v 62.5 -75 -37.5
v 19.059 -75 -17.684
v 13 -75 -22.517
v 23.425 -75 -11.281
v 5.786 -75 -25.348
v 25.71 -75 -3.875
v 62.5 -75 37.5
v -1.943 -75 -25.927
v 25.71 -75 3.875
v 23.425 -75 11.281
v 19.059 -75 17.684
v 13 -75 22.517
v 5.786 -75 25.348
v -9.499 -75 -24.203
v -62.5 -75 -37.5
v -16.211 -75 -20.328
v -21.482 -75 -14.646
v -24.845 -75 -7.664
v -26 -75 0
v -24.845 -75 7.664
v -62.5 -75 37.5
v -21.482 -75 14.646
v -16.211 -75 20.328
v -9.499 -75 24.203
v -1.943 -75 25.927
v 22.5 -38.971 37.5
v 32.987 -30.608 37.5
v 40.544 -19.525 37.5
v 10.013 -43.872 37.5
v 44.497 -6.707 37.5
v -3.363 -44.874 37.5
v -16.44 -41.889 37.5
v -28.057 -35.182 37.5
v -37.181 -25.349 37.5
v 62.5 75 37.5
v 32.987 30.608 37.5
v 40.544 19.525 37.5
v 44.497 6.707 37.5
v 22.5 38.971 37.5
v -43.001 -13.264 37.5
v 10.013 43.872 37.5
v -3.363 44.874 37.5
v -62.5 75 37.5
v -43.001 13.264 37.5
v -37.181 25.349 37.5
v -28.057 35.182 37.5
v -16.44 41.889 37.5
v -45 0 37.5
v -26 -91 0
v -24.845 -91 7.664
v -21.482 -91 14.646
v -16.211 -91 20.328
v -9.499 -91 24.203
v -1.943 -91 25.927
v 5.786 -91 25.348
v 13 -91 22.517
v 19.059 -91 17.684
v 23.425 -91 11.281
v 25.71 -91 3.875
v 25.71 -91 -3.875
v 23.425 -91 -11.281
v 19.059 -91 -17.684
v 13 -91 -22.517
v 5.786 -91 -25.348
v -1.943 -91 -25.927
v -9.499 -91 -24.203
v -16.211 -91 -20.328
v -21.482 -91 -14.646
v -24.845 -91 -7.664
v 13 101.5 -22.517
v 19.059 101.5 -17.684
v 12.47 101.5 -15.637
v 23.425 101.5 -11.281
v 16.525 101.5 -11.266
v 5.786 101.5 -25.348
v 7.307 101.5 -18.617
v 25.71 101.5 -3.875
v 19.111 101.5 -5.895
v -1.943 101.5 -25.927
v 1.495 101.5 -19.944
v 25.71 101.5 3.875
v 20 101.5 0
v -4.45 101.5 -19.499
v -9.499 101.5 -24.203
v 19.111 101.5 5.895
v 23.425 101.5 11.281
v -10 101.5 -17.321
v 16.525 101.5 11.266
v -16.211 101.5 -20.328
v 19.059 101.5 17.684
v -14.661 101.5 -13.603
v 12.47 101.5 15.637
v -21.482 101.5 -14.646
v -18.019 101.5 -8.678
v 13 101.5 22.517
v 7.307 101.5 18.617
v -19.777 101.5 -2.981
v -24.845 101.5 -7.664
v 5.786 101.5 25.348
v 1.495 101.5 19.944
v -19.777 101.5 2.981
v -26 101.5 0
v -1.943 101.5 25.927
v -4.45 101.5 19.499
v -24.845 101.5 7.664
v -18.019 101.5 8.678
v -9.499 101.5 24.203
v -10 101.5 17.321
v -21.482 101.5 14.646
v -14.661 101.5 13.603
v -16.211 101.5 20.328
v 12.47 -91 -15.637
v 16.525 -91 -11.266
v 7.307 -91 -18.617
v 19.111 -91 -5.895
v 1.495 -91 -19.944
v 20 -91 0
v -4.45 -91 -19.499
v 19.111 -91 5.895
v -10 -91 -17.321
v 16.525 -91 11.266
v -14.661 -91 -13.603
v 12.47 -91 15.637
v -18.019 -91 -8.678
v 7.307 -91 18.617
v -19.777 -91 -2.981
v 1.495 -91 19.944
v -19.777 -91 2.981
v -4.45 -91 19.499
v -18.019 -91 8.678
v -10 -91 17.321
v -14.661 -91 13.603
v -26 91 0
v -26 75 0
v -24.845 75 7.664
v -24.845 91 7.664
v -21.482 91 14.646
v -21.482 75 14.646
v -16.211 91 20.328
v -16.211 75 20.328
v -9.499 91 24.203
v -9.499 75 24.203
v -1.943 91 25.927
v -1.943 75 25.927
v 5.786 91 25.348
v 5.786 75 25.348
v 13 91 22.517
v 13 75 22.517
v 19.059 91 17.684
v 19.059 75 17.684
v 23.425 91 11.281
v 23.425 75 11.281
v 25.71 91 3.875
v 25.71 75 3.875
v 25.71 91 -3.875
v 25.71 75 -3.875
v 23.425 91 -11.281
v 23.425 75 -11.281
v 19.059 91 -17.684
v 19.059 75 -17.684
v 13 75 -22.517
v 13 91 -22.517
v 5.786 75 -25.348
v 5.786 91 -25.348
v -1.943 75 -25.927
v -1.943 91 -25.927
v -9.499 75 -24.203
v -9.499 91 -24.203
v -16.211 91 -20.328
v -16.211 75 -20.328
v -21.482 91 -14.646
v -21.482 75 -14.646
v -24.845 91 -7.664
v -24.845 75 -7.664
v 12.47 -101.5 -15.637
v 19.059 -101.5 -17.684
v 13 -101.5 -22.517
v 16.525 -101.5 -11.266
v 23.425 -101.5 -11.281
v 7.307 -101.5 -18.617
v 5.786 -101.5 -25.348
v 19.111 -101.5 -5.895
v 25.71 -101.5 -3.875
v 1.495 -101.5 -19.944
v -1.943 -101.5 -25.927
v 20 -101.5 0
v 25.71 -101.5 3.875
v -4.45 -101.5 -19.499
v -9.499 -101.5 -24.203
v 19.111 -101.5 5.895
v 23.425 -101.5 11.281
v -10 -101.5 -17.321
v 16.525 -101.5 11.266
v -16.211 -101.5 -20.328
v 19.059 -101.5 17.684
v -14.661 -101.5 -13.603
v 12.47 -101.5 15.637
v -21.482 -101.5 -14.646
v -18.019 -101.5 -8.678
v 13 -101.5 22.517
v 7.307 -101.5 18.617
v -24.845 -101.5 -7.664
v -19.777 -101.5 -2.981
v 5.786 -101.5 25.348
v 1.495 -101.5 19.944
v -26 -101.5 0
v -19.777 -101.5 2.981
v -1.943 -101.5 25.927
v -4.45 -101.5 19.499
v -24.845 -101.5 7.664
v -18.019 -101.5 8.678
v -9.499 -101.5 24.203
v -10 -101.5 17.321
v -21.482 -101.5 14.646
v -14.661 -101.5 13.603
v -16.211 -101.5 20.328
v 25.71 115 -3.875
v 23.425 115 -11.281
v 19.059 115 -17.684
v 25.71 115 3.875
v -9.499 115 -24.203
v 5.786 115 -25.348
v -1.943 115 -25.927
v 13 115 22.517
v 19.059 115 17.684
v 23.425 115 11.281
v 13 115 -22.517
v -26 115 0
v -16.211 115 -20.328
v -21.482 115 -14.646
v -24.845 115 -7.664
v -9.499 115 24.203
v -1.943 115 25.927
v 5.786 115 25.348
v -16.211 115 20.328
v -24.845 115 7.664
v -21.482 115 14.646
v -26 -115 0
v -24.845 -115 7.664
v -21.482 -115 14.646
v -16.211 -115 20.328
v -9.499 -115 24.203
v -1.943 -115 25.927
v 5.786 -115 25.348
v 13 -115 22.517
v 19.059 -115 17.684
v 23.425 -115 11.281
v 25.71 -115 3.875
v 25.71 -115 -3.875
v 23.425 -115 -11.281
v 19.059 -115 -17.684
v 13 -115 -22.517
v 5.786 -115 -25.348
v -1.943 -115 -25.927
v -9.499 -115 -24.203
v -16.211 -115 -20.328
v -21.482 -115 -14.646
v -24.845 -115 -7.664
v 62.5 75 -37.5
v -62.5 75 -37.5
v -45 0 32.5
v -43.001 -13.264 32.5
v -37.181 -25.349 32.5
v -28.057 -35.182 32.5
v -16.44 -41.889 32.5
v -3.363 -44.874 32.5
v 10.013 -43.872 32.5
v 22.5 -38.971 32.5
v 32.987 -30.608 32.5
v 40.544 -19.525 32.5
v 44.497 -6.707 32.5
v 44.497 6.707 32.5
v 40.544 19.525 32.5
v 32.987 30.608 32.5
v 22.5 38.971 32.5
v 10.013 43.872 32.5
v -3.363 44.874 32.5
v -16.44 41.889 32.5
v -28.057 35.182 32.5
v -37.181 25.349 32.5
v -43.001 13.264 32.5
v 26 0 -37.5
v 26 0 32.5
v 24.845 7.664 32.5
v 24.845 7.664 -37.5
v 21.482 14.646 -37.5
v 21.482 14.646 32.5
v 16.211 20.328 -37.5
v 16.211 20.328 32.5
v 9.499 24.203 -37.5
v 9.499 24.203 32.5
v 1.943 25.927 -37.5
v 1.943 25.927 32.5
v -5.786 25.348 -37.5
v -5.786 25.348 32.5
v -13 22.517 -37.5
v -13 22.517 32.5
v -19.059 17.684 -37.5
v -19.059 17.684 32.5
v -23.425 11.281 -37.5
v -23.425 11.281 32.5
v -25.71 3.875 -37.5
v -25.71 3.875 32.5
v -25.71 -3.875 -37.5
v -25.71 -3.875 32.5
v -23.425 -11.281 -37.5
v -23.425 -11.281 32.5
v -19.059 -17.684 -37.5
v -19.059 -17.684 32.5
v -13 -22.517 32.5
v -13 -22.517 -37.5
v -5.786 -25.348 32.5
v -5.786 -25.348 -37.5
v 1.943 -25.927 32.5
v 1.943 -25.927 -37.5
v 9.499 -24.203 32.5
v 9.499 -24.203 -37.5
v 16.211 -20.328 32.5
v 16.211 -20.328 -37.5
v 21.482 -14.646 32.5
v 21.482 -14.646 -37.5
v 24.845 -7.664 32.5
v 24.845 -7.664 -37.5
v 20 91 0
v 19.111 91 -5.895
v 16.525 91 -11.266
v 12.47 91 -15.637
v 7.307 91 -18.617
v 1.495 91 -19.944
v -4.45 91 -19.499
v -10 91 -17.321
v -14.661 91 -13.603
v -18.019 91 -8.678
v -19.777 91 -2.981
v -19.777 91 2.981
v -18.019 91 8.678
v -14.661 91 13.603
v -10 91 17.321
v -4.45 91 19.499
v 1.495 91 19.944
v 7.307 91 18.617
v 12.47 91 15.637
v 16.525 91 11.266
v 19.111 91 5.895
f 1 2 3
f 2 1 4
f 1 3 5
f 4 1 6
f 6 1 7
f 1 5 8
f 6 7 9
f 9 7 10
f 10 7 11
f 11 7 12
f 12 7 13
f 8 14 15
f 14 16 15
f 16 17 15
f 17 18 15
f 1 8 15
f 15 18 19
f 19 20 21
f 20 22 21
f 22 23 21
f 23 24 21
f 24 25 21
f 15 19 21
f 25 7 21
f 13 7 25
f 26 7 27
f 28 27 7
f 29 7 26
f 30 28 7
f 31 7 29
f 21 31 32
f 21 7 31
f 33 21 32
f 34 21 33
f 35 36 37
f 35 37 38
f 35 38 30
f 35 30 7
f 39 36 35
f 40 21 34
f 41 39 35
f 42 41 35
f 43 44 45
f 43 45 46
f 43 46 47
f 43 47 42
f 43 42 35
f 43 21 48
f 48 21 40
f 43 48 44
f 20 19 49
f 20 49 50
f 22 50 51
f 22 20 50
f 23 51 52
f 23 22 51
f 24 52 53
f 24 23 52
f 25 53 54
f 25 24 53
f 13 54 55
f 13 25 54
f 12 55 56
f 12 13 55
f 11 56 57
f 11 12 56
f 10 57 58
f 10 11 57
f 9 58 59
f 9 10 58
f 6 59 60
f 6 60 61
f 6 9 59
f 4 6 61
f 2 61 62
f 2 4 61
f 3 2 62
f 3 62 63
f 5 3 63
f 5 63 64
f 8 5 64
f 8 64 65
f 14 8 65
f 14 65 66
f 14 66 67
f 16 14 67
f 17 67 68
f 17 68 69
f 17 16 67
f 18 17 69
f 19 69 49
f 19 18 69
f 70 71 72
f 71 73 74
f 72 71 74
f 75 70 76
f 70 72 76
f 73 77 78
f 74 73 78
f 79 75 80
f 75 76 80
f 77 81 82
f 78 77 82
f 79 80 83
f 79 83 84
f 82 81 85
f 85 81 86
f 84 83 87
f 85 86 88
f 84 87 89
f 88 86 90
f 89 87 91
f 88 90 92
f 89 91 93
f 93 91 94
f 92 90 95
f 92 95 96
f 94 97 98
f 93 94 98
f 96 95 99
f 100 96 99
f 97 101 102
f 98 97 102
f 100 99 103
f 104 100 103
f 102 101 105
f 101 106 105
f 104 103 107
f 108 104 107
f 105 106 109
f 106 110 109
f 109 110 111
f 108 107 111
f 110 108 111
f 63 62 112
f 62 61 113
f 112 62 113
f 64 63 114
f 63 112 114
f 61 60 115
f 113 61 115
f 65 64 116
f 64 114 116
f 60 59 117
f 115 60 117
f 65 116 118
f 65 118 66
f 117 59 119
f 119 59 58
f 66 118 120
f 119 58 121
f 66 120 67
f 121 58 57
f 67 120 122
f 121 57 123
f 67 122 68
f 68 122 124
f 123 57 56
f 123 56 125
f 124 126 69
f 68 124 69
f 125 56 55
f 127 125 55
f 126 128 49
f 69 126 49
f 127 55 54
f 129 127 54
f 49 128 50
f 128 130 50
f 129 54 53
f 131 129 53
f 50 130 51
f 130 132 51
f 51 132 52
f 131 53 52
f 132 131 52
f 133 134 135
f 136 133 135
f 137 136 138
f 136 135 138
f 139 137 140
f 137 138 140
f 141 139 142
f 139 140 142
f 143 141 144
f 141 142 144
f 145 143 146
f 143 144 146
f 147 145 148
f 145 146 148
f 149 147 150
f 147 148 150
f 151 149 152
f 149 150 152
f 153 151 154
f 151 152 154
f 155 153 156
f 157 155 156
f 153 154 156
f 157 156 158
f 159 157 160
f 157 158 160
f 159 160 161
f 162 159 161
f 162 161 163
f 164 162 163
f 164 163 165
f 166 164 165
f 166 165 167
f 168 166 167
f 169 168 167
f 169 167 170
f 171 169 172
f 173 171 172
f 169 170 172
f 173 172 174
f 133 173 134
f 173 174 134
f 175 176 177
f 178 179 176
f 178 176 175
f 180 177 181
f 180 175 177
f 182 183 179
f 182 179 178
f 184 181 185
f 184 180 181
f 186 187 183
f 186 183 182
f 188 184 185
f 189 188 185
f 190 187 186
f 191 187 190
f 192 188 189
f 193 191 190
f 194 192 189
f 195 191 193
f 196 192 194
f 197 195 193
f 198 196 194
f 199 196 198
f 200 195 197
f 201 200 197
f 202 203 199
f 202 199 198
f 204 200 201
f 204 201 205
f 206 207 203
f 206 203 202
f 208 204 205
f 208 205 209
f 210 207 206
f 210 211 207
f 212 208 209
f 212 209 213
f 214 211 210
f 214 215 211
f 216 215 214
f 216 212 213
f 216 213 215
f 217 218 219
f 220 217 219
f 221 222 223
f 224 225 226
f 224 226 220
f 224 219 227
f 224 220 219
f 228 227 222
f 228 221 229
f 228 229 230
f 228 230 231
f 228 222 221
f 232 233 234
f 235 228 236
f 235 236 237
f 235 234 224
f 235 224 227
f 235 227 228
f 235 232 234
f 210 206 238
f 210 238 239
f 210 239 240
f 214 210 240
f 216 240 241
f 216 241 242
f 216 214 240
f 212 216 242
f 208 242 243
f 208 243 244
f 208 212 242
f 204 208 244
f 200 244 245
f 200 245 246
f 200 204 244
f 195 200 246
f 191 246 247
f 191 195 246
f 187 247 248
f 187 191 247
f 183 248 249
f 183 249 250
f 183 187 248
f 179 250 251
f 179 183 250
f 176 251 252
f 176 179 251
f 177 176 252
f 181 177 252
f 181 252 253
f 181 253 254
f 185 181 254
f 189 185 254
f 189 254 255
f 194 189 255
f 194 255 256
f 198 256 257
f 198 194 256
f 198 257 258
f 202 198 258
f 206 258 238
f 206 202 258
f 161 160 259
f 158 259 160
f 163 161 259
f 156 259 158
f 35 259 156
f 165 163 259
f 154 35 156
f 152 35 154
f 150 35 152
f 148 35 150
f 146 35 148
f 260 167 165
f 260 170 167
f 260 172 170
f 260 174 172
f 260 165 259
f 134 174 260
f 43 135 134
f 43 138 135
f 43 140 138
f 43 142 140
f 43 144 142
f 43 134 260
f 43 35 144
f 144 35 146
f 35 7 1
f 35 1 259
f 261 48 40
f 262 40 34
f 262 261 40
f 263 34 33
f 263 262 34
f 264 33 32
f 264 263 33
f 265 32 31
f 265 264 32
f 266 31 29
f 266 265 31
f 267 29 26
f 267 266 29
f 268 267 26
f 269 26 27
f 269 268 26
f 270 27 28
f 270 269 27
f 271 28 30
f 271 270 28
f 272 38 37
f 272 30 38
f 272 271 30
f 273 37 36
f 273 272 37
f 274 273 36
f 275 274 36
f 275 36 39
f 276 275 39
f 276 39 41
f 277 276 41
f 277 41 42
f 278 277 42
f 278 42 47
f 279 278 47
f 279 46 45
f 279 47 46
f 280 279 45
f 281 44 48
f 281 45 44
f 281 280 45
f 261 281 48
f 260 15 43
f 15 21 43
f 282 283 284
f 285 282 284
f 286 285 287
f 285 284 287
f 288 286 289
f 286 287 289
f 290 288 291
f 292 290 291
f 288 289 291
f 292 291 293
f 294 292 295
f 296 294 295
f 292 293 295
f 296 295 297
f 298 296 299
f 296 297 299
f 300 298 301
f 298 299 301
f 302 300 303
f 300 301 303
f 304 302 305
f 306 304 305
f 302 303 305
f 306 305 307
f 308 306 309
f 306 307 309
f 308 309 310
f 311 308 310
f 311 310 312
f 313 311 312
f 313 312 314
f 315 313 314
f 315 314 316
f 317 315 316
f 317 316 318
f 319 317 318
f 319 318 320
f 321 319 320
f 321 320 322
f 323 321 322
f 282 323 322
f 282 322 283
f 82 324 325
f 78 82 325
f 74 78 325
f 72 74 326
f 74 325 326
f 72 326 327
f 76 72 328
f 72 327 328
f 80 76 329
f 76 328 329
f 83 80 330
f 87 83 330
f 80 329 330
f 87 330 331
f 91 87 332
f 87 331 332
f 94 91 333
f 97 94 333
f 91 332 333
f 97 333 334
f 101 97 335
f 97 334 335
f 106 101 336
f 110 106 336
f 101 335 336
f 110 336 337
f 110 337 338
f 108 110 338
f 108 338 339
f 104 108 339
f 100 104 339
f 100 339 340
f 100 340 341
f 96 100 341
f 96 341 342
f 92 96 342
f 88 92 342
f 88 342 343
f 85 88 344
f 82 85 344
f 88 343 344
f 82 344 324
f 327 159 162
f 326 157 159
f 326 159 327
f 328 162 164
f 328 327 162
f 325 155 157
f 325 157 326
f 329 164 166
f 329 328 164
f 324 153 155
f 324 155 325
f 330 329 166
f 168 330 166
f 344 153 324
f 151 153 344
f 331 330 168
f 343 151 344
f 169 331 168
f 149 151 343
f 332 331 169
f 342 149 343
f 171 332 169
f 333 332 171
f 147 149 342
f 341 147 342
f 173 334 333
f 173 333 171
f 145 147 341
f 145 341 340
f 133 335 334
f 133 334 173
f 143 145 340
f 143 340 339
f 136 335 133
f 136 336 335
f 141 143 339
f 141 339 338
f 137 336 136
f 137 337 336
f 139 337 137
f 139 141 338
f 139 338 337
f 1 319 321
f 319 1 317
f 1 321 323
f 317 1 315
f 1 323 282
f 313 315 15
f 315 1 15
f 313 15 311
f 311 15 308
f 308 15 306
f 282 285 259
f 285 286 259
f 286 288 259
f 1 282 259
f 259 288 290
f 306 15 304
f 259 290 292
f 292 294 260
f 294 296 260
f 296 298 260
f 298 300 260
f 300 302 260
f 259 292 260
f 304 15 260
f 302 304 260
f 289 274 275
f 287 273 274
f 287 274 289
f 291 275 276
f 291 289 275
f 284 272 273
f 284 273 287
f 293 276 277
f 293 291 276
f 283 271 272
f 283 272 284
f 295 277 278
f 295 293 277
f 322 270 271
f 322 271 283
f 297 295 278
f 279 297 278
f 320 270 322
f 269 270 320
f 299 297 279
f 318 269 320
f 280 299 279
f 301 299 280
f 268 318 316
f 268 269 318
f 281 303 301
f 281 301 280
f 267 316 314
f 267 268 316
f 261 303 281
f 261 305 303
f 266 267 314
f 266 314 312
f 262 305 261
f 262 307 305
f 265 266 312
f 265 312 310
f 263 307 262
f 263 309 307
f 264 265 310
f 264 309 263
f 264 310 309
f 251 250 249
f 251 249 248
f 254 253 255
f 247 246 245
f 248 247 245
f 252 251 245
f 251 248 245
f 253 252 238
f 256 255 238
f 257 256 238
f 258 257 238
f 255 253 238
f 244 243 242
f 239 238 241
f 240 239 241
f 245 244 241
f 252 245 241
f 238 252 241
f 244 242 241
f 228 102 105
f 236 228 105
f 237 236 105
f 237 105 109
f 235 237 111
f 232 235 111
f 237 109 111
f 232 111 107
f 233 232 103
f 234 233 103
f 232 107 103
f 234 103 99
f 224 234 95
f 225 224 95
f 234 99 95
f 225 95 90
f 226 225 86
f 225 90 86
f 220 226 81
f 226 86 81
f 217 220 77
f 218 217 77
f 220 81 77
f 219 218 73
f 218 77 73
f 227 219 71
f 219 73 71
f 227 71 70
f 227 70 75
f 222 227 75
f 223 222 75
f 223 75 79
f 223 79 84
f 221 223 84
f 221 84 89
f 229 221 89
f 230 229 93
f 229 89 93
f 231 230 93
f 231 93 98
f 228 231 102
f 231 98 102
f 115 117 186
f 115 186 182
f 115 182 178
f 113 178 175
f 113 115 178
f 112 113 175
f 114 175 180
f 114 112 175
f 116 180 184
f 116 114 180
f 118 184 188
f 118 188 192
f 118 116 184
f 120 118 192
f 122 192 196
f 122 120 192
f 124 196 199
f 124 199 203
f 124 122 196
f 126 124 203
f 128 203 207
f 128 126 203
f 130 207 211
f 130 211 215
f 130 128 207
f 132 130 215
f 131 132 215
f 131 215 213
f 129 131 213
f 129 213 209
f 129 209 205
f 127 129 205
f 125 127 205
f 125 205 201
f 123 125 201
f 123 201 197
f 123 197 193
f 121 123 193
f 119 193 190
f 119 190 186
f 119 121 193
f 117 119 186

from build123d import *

# Parameters (mm, degrees)
SKETCH1_W               = 150
SKETCH1_H               = 125
BOSS_EXTRUDE1_DEPTH     = 37.5
CUT_EXTRUDE1_DEPTH      = 124.110722522
CUT_EXTRUDE1_DEPTH_BACK = 5
SKETCH2_R               = 45
CUT_EXTRUDE2_REACH      = 122.13
SKETCH3_R               = 26
SKETCH4_R               = 26
BOSS_EXTRUDE2_DEPTH     = 16
SKETCH5_R               = 20
BOSS_EXTRUDE3_DEPTH     = 10.5
SKETCH6_R               = 26
BOSS_EXTRUDE4_DEPTH     = 13.5


with BuildPart() as part:
    # Sketch1 → Boss-Extrude1 (new, symmetric)
    with BuildSketch(Plane(origin=(0, 0, 0), x_dir=(0, 1, 0), z_dir=(0, 0, 1))):
        Rectangle(SKETCH1_W, SKETCH1_H)
    extrude(amount=BOSS_EXTRUDE1_DEPTH, both=True)

    # Sketch2 → Cut-Extrude1 (cut, two sides: drawn at the far end of the back side and taken through both)
    with BuildSketch(Plane.XY.offset(37.5).offset(-CUT_EXTRUDE1_DEPTH_BACK)):
        with Locations(Location((0, 0, 0), (0, 0, 180))):
            Circle(SKETCH2_R)
    extrude(amount=CUT_EXTRUDE1_DEPTH + CUT_EXTRUDE1_DEPTH_BACK, mode=Mode.SUBTRACT)

    # Sketch3 → Cut-Extrude2 (cut, up to next)
    with BuildSketch(Plane.XY.offset(32.5), mode=Mode.PRIVATE) as cut_extrude2_sk1:
        Circle(SKETCH3_R)
    cut_extrude2_tool1 = extrude(cut_extrude2_sk1.sketch, amount=-CUT_EXTRUDE2_REACH, mode=Mode.PRIVATE) & part.part
    add(cut_extrude2_tool1.solids().sort_by_distance((0, 0, 32.5))[0], mode=Mode.SUBTRACT)

    # Sketch4 → Boss-Extrude2 (add)
    with BuildSketch(Plane(origin=(0, 75, 0), x_dir=(-1, 0, 0), z_dir=(0, 1, 0))):
        Circle(SKETCH4_R)
    boss_extrude2 = extrude(amount=BOSS_EXTRUDE2_DEPTH)

    # Sketch5 → Boss-Extrude3 (add)
    with BuildSketch(Plane(origin=(0, 91, 0), x_dir=(-1, 0, 0), z_dir=(0, 1, 0))):
        with Locations(Location((0, 0, 0), (0, 0, 180))):
            Circle(SKETCH5_R)
    boss_extrude3 = extrude(amount=BOSS_EXTRUDE3_DEPTH)

    # Sketch6 → Boss-Extrude4 (add)
    with BuildSketch(Plane(origin=(0, 101.5, 0), x_dir=(-1, 0, 0), z_dir=(0, 1, 0))):
        Circle(SKETCH6_R)
    boss_extrude4 = extrude(amount=BOSS_EXTRUDE4_DEPTH)

    # Mirror1: Boss-Extrude2, Boss-Extrude3, Boss-Extrude4 across plane
    add(boss_extrude2.mirror(Plane.ZX))
    add(boss_extrude3.mirror(Plane.ZX))
    add(boss_extrude4.mirror(Plane.ZX))


solid = part.part
